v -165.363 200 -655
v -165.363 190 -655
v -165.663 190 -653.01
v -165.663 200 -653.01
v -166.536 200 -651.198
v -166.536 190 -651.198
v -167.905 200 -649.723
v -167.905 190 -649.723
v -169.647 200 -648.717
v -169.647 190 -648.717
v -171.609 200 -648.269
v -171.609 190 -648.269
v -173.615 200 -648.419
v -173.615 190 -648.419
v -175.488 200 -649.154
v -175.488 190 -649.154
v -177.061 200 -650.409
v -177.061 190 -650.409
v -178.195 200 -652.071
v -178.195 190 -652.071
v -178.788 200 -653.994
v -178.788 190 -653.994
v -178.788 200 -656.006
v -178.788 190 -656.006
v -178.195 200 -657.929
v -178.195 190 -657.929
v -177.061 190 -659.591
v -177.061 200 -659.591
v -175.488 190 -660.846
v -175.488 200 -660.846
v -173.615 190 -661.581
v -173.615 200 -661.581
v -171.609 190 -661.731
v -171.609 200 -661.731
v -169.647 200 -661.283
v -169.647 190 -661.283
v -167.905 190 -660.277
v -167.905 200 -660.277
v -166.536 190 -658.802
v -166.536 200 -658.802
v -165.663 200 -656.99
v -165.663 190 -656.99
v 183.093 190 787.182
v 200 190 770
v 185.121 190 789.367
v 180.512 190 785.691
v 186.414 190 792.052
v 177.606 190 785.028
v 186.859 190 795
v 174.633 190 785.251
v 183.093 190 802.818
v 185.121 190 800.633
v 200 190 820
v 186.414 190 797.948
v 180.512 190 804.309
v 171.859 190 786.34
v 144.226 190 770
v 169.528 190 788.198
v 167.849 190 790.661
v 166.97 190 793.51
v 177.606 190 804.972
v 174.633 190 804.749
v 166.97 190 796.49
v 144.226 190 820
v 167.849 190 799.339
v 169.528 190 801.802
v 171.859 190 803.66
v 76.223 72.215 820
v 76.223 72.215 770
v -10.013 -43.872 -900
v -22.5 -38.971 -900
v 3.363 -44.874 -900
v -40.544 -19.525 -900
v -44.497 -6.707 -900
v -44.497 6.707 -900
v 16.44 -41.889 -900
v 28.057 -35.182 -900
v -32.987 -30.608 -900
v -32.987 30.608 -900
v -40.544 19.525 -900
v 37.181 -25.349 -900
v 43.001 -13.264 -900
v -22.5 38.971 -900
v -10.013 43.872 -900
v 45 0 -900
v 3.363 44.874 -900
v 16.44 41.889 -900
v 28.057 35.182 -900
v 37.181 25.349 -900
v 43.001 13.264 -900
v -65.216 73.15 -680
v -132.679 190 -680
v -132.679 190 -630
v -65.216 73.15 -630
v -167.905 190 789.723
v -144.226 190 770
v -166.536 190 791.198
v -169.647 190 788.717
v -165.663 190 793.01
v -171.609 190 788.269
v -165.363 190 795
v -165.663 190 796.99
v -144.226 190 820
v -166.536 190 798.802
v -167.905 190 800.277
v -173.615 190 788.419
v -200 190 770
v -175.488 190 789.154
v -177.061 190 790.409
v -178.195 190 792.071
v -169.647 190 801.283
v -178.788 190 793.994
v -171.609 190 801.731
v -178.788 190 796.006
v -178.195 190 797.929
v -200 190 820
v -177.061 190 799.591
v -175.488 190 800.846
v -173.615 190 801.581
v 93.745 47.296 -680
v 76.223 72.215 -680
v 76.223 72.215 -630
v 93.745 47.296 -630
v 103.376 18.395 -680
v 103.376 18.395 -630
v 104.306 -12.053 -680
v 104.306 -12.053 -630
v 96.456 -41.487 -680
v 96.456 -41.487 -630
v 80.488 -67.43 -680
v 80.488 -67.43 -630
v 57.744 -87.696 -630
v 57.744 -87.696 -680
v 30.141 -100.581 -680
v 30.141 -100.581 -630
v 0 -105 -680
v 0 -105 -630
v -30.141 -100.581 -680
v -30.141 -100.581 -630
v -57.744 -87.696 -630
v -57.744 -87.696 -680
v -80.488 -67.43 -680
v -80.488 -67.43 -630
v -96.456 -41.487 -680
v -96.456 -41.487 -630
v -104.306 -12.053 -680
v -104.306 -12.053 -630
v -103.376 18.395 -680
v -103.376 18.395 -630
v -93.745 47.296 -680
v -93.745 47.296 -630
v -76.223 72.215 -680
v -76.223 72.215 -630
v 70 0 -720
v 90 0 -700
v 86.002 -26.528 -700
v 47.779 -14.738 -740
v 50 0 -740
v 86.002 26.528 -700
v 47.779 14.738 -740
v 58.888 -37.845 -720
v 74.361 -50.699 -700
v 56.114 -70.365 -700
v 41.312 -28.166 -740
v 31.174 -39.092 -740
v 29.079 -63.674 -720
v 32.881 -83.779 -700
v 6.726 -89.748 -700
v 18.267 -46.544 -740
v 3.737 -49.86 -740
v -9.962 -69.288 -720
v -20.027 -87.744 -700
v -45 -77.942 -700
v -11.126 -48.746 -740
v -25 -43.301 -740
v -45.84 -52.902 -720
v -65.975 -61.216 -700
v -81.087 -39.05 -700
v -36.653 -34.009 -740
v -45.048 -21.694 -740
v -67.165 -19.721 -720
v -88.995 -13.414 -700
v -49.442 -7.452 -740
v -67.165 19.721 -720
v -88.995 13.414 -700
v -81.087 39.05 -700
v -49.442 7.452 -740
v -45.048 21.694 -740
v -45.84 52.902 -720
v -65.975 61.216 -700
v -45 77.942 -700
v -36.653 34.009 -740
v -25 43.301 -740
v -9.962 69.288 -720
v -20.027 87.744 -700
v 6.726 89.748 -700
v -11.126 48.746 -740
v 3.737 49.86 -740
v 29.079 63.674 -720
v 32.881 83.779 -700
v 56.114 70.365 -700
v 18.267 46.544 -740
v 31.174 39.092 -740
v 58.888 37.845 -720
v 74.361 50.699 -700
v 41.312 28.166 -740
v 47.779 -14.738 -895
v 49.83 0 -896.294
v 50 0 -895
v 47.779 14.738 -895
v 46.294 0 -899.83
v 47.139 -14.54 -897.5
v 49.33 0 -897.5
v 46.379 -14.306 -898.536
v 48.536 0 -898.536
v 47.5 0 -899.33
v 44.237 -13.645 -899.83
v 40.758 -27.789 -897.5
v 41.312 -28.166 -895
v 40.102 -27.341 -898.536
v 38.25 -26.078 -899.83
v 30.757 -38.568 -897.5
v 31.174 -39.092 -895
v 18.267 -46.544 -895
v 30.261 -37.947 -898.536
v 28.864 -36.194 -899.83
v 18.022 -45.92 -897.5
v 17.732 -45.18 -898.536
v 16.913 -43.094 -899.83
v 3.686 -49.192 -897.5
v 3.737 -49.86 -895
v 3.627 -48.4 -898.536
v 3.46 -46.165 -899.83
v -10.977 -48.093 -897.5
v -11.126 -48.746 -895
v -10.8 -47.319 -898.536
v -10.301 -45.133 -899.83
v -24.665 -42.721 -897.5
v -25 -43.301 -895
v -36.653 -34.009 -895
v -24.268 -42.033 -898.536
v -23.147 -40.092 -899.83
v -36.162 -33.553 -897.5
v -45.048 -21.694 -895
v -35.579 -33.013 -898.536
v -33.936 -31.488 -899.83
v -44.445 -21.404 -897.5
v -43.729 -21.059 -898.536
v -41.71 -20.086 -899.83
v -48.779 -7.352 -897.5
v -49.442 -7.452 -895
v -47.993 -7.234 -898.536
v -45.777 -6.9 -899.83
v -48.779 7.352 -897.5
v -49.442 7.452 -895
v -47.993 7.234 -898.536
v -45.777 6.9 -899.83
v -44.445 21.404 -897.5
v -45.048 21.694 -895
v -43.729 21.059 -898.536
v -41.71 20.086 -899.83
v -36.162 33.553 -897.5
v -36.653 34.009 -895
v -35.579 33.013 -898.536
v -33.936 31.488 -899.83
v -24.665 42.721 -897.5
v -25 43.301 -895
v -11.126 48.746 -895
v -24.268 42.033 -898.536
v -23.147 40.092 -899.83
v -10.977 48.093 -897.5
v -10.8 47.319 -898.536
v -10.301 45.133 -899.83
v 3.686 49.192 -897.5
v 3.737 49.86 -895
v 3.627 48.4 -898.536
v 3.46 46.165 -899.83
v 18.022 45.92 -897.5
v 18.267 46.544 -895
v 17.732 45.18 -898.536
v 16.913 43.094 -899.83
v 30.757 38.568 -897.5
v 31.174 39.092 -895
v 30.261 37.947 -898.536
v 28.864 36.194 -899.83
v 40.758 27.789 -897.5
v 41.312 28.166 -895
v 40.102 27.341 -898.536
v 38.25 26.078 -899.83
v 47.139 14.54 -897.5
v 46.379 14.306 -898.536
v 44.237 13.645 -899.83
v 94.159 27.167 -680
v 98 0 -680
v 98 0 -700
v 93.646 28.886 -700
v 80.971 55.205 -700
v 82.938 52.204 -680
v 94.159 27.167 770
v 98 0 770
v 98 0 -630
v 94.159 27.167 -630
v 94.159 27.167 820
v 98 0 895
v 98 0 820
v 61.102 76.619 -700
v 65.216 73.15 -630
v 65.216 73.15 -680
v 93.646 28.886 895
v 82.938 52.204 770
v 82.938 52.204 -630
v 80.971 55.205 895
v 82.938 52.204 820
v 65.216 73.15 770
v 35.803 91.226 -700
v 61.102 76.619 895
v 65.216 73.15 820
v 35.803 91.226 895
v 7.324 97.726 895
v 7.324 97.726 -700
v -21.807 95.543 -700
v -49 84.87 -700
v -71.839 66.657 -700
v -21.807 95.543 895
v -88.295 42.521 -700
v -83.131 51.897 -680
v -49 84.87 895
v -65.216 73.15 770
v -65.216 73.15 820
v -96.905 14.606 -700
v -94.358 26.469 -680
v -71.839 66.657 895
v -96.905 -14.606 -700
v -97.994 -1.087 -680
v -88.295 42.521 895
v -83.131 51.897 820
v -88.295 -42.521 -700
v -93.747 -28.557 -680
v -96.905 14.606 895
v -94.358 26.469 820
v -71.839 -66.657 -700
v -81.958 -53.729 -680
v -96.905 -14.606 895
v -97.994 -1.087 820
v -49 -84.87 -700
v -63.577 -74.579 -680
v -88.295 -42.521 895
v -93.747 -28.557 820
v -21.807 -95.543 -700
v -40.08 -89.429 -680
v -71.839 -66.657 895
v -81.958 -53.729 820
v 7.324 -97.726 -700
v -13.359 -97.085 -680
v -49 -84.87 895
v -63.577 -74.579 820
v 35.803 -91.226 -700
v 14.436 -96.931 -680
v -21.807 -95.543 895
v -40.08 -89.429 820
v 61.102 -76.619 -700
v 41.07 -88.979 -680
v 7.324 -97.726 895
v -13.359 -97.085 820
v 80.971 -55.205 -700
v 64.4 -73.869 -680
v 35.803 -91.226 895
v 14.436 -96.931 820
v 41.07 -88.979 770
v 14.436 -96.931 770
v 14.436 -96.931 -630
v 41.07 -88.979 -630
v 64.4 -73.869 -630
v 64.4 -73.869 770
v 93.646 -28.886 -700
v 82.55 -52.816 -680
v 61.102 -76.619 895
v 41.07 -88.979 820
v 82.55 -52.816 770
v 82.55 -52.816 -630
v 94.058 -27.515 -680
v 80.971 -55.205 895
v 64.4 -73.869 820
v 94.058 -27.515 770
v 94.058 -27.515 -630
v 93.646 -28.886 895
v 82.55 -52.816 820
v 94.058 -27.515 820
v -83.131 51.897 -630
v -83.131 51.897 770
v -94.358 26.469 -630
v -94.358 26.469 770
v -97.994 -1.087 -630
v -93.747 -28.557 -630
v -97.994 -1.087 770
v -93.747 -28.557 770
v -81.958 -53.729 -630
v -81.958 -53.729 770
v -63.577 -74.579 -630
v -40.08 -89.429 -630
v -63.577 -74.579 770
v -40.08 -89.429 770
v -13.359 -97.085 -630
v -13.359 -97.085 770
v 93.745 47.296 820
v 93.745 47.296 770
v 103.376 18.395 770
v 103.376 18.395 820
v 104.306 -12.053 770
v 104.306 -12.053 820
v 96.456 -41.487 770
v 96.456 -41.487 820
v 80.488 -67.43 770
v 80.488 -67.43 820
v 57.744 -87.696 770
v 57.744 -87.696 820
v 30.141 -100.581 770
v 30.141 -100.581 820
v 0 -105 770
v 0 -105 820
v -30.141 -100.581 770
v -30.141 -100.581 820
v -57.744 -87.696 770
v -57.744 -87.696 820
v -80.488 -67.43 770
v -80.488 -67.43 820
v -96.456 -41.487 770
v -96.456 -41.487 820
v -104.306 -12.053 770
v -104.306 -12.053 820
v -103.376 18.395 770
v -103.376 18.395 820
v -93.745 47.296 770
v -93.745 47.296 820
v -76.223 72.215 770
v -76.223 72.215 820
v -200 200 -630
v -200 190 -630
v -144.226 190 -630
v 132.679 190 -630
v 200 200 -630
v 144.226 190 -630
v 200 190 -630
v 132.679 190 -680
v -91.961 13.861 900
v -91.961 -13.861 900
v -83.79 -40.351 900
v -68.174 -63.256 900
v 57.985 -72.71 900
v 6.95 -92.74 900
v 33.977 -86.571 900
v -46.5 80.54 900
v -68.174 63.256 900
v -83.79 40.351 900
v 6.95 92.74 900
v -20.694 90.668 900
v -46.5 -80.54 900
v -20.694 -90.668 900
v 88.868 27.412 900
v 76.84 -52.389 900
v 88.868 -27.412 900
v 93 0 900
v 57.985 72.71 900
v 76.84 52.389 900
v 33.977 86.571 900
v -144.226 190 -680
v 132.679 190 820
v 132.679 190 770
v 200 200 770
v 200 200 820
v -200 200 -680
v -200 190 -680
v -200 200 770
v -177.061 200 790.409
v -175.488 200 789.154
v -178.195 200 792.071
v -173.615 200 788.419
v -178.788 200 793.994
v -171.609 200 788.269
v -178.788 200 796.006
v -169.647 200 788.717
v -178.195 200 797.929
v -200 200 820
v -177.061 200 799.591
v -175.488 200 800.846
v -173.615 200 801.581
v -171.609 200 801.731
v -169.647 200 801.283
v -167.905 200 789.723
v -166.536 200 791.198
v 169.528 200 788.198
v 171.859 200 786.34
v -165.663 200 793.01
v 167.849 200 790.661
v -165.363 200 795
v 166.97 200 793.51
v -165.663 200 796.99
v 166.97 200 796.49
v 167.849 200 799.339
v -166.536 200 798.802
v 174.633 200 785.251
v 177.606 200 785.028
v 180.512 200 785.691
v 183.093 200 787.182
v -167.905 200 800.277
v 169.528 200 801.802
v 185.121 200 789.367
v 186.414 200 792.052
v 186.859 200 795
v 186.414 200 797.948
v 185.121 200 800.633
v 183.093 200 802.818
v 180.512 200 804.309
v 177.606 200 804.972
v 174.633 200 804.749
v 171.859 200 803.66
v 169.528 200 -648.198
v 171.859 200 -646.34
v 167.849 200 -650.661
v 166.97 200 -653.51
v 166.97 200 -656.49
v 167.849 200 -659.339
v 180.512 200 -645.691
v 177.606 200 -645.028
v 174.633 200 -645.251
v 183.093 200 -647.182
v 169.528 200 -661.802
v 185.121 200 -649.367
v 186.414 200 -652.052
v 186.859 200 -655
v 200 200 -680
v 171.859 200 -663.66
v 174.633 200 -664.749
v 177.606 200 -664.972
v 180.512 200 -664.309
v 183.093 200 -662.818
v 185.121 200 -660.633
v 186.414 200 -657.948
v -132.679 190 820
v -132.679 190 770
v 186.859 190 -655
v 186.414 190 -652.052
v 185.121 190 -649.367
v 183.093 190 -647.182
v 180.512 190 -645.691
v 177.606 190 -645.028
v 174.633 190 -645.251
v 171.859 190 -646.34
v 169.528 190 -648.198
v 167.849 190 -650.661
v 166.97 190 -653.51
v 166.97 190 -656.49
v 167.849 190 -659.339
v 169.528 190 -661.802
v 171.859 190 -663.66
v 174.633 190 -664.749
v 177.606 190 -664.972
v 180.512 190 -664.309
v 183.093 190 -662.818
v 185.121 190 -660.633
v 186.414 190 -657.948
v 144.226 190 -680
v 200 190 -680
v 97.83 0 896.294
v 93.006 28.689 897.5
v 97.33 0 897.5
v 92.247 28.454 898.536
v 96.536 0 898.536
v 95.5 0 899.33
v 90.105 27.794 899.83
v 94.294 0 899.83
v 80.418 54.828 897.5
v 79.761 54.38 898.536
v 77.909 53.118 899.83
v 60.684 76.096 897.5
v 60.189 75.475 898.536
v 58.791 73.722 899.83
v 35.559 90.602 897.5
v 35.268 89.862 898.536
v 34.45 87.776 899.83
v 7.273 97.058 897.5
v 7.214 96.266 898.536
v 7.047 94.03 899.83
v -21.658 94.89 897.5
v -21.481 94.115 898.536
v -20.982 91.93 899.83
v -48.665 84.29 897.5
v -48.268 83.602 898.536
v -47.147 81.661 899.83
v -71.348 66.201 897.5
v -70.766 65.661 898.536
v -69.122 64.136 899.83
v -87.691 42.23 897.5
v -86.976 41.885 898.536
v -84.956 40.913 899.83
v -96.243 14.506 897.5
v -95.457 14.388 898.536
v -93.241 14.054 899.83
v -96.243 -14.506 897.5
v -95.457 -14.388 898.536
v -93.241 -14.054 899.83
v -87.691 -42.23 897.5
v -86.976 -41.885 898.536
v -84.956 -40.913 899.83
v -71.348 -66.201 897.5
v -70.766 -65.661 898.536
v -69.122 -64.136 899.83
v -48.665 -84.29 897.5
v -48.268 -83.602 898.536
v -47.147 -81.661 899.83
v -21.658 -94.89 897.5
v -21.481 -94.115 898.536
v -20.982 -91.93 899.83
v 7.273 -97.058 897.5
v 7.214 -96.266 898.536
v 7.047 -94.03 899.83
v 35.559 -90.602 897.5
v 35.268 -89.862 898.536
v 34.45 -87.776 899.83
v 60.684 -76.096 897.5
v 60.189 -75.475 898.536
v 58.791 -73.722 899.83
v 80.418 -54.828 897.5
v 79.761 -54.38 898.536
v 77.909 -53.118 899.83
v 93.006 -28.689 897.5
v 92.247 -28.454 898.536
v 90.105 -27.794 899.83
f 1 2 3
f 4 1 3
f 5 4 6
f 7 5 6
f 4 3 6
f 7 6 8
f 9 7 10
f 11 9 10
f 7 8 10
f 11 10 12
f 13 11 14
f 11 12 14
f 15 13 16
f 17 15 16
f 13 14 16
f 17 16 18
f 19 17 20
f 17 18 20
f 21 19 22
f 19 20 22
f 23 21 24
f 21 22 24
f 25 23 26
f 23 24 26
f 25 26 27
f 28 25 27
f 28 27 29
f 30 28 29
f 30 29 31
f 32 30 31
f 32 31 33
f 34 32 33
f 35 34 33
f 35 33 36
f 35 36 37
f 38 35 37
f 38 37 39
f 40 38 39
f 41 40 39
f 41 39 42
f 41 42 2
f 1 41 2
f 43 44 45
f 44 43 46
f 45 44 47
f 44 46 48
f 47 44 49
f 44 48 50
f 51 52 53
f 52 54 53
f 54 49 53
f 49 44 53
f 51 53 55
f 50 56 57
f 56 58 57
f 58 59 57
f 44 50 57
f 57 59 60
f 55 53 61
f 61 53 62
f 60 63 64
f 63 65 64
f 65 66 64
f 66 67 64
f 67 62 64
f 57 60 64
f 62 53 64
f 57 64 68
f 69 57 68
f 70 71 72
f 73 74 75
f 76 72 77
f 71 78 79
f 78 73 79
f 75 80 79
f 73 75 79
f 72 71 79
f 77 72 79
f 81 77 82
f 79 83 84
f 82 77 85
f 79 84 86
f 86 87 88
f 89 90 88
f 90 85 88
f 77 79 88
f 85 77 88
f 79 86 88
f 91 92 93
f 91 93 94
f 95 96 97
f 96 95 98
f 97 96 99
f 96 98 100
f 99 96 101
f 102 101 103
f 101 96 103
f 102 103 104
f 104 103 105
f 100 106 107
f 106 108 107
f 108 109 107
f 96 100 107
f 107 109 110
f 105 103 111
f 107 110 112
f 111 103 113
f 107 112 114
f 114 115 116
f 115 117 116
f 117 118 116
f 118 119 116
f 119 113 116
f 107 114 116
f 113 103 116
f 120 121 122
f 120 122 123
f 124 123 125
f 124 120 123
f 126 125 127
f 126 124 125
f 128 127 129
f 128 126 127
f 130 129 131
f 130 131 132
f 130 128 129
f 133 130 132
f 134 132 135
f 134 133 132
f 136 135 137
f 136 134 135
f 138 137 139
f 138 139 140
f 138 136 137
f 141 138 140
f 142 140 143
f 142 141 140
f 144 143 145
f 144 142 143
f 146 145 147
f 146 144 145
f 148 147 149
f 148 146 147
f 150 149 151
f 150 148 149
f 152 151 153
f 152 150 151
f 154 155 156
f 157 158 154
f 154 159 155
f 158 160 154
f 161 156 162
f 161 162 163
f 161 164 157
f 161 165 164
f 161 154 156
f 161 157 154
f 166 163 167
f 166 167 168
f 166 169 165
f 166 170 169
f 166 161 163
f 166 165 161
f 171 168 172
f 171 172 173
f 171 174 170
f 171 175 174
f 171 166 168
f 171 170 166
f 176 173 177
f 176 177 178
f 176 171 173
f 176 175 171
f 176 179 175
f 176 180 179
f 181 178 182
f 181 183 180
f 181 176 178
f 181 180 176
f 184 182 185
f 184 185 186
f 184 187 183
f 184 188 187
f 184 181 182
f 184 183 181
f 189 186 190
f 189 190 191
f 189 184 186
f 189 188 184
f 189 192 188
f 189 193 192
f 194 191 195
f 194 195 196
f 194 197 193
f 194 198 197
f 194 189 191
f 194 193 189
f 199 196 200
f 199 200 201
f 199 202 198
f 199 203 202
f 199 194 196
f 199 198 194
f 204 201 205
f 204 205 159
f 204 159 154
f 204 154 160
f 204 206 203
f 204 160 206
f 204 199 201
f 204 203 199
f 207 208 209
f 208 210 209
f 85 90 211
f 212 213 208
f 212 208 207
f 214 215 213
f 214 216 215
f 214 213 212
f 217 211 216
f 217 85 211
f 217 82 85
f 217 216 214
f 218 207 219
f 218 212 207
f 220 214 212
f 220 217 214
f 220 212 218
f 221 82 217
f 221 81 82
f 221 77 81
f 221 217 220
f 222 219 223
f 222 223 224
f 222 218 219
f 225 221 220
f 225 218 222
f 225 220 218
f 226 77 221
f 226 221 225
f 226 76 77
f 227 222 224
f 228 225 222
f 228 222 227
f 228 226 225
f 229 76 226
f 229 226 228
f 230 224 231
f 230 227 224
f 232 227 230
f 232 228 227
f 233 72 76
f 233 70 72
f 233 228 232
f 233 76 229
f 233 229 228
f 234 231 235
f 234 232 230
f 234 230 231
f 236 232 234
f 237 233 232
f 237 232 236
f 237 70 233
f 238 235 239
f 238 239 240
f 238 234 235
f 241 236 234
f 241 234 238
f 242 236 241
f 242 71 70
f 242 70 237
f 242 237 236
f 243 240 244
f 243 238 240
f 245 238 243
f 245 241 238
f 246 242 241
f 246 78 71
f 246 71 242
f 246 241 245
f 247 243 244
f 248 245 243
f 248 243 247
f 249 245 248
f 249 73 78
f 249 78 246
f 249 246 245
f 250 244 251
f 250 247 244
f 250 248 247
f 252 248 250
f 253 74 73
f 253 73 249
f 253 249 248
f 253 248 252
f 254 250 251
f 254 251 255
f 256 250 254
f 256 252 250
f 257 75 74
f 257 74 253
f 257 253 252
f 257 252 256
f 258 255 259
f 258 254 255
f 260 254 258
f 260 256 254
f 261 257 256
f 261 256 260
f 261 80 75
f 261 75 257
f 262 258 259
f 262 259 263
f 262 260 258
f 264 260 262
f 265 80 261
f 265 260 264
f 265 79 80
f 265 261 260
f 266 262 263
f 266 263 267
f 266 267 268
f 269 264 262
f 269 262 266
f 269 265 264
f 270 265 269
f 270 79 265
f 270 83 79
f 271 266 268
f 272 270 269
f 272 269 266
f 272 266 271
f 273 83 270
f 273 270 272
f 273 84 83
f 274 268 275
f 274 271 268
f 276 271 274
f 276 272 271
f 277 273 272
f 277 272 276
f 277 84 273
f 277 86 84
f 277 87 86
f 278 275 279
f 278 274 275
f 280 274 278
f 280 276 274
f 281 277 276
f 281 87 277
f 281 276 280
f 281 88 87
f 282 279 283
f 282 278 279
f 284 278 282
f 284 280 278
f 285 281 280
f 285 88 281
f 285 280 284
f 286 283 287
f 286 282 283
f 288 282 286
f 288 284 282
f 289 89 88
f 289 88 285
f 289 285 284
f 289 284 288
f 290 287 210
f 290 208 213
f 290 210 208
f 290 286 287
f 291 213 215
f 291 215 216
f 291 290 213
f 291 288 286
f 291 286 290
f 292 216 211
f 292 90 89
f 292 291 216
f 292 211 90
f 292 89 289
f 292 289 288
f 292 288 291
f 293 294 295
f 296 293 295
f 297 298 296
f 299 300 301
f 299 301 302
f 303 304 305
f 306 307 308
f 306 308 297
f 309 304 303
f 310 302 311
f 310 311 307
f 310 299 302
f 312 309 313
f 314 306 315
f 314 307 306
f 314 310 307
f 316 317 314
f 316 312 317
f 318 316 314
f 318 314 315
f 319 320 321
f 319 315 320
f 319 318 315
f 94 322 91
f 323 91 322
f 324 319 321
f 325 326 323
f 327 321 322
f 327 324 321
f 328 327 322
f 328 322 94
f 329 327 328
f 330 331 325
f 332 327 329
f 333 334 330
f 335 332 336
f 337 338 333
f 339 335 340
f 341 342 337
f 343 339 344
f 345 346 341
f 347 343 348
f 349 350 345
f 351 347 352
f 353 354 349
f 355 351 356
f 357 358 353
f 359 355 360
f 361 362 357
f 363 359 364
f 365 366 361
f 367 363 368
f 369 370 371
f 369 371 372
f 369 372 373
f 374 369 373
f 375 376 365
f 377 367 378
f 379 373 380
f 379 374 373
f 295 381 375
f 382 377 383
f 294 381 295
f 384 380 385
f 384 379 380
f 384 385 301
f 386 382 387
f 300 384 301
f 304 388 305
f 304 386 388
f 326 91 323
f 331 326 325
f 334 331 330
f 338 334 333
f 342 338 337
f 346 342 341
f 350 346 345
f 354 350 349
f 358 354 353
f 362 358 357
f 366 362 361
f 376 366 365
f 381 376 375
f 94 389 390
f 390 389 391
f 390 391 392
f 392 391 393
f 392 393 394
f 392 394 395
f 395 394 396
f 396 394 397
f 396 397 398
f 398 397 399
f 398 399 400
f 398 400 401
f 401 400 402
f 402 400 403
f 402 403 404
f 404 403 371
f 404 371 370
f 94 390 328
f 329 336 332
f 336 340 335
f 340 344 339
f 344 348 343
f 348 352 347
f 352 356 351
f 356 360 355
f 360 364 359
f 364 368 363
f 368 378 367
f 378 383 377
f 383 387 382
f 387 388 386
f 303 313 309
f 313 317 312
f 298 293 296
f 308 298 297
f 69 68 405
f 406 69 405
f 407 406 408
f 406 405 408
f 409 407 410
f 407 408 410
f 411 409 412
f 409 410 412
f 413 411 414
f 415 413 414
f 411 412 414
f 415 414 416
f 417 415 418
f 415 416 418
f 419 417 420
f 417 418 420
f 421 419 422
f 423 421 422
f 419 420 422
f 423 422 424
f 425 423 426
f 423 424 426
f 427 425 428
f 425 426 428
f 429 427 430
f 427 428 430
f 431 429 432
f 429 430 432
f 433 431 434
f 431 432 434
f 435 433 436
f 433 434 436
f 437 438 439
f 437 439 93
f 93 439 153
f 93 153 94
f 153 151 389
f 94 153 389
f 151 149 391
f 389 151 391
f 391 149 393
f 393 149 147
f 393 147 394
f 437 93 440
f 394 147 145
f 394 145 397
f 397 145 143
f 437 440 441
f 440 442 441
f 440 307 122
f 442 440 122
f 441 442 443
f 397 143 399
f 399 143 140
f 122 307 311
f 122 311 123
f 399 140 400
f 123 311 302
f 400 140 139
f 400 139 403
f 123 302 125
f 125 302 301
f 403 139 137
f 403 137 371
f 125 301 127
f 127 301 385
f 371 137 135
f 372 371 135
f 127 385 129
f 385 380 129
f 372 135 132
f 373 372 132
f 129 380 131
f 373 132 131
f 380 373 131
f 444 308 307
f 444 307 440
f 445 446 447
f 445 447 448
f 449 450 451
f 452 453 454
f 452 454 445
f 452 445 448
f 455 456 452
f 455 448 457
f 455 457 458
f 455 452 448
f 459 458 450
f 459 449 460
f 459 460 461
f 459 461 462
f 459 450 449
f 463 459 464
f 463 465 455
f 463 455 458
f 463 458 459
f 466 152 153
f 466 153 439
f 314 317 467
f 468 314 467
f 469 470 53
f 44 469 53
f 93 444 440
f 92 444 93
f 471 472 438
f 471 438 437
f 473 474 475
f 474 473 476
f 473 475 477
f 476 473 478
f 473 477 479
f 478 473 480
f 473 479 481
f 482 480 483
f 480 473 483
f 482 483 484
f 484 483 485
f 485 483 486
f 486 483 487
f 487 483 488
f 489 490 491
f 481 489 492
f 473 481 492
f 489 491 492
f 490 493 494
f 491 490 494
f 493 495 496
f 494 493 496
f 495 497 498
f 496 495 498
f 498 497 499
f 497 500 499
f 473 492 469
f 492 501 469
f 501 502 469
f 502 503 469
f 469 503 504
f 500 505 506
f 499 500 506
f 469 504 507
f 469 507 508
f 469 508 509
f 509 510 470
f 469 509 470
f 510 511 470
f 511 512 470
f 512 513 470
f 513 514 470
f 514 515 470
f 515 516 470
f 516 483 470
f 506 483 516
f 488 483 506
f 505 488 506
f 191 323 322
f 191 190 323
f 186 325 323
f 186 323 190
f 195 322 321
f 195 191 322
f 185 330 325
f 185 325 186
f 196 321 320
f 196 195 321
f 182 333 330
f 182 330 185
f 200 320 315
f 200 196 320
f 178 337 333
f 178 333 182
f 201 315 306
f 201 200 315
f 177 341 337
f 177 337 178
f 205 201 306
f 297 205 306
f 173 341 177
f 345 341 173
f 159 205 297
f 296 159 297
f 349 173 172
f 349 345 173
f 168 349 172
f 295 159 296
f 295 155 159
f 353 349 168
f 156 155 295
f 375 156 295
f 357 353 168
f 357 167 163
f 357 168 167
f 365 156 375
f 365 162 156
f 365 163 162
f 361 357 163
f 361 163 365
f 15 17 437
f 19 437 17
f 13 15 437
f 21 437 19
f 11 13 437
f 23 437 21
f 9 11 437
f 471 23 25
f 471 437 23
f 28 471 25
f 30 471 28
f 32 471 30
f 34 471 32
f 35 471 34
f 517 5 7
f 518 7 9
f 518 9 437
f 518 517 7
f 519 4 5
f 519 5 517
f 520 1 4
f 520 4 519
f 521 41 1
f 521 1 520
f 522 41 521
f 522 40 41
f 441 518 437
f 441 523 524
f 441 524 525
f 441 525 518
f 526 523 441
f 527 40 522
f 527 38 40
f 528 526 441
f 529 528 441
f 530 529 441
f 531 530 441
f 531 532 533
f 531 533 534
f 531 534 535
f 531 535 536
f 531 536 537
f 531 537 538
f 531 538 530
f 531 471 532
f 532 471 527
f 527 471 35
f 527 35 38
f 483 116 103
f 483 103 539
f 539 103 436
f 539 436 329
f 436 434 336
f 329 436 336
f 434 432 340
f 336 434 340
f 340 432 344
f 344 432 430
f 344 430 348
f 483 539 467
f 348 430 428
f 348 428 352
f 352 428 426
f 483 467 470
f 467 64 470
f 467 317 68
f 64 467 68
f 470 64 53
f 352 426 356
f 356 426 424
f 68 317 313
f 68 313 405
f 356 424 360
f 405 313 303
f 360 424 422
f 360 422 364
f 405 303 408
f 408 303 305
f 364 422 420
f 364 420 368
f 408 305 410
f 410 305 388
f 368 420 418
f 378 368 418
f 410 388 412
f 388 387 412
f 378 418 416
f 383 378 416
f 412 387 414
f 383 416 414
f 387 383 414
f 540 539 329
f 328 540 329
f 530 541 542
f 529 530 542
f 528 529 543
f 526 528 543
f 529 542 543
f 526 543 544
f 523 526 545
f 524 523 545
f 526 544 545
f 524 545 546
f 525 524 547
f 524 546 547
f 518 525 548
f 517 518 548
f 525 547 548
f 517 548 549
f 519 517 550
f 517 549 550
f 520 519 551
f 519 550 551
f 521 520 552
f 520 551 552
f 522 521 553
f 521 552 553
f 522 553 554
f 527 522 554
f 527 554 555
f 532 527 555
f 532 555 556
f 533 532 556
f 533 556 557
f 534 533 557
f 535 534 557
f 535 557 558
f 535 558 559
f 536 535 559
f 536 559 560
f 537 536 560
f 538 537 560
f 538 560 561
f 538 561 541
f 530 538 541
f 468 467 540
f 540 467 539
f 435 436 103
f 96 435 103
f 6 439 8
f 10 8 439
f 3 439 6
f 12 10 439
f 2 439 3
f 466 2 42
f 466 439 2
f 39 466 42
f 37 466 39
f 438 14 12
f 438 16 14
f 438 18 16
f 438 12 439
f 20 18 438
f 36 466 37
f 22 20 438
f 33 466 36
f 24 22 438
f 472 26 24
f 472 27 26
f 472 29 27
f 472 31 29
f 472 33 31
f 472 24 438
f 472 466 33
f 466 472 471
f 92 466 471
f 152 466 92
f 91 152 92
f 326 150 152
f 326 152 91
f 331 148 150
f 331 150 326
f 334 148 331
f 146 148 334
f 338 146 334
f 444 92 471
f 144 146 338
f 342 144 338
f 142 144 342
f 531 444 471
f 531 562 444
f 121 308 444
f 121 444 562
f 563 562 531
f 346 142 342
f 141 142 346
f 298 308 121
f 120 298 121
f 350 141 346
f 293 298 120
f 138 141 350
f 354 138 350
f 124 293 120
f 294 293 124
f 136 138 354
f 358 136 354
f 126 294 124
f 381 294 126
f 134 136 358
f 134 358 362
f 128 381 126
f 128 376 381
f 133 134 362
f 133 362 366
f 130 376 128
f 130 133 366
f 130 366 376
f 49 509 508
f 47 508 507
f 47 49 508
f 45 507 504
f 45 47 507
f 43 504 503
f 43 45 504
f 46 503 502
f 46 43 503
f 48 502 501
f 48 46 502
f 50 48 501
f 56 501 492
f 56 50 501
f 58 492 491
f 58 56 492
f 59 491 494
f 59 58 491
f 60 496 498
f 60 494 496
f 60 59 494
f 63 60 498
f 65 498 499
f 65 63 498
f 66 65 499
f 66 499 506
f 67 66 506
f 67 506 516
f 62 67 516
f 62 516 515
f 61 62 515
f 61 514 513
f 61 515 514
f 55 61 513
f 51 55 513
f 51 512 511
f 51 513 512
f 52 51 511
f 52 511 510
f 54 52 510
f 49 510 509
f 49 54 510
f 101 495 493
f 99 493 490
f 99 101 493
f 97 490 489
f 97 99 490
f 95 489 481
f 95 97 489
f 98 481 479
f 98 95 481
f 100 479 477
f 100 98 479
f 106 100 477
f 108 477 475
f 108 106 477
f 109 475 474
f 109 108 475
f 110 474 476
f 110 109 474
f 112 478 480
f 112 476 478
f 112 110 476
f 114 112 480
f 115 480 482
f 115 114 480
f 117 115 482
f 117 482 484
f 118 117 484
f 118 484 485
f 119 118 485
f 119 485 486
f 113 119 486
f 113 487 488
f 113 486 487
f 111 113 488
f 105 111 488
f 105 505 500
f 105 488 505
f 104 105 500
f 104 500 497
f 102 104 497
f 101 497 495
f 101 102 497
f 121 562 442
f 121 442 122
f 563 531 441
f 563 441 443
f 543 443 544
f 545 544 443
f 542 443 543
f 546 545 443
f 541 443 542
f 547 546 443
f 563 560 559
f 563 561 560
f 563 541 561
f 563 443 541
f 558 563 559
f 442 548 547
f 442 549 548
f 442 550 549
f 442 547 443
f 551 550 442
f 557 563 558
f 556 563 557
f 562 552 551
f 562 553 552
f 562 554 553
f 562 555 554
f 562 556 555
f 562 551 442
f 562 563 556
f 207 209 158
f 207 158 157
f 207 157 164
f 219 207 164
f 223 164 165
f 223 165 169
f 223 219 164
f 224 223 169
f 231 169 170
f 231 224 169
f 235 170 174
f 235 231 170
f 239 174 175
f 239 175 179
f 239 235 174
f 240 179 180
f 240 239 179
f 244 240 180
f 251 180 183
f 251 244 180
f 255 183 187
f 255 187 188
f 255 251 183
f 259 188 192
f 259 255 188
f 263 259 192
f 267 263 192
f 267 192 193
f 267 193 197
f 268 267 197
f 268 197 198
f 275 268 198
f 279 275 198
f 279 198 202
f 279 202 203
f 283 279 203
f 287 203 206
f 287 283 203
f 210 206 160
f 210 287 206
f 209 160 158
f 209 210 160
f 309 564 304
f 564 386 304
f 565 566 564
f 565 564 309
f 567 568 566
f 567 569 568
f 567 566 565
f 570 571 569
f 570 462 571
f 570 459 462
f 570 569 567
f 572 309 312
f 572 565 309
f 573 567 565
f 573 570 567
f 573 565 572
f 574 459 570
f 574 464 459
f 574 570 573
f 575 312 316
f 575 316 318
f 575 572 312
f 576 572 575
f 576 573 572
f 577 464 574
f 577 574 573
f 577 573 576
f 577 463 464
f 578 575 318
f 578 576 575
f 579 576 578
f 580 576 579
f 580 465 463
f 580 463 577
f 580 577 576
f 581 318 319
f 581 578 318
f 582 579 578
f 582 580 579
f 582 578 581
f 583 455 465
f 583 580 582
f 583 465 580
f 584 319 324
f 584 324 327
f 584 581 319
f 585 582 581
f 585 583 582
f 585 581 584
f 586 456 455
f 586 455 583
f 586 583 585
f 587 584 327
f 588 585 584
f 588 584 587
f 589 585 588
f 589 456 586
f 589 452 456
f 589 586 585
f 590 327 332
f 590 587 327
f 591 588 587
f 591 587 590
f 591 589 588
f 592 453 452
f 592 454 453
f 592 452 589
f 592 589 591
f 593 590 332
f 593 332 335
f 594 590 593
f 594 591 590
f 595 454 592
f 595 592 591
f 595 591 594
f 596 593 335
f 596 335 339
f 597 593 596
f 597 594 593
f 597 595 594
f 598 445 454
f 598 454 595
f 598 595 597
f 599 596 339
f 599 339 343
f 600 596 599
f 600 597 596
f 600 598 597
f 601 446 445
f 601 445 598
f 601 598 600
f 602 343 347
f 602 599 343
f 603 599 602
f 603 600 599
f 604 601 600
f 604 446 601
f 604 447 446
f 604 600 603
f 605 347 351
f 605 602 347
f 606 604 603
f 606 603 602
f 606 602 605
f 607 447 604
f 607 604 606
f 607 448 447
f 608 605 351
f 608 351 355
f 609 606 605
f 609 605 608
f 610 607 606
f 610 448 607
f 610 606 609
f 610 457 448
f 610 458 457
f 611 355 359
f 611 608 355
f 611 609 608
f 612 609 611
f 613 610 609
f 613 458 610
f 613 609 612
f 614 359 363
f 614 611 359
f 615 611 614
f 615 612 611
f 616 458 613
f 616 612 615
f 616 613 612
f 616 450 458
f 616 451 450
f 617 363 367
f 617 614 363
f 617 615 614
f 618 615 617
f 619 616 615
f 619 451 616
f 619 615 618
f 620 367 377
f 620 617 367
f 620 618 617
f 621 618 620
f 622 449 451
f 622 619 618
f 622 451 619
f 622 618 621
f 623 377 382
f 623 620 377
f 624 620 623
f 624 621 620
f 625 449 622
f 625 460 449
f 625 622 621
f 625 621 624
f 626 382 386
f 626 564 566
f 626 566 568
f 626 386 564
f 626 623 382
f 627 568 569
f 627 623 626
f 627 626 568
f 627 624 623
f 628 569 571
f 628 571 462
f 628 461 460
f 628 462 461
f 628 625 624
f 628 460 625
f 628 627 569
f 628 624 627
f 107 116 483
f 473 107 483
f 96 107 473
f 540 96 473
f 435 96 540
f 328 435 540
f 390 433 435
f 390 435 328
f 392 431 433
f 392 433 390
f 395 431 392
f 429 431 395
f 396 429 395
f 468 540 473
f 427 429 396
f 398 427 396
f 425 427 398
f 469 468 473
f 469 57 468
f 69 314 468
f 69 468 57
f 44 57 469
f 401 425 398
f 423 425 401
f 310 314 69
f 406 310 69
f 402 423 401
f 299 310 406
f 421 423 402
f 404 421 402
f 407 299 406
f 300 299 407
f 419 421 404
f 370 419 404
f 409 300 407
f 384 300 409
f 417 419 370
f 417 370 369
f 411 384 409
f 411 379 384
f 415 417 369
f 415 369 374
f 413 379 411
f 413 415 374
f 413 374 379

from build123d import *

# Parameters (mm, degrees)
F0_R      = 98
F1_DEPTH  = 900
F2_R      = 98
F2_R_2    = 50
F3_DEPTH  = 200
F4_SIZE   = 40
F5_R      = 5
F8_DEPTH  = 50
F9_R      = 6.75
F9_R_2    = 10
F10_DEPTH = 10.001


# Not quite as in the source:
# - a pattern or mirror of a feature is missing from the dataset's text; its kind, count and spacing are read off the source's solid


with BuildPart() as f1:
    # F0 (on Top) → F1 (new body, symmetric)
    with BuildSketch(Plane.XY):
        Circle(F0_R)
    extrude(amount=F1_DEPTH, both=True)

    # F2 (on face) → F3 (cut)
    with BuildSketch(Plane(origin=(0, 0, -900), x_dir=(1, 0, 0), z_dir=(0, 0, -1))):
        Circle(F2_R)
        Circle(F2_R_2, mode=Mode.SUBTRACT)
    extrude(amount=-F3_DEPTH, mode=Mode.SUBTRACT)

    # F4
    f4_edges = [f1.edges().sort_by_distance(p)[0] for p in [
        (-50, 0, -700),
    ]]
    chamfer(f4_edges, length=F4_SIZE)

    # F5
    f5_edges = [f1.edges().sort_by_distance(p)[0] for p in [
        (-50, 0, -900),
        (-98, 0, 900),
    ]]
    fillet(f5_edges, radius=F5_R)

    # F7 (on offset) → F8 (join)
    with BuildSketch(Plane(origin=(0, 0, -680), x_dir=(1, 0, 0), z_dir=(0, 0, -1))):
        Polygon((76.2233031652, -72.2150126676), (65.2159465136, -73.14971169), (132.6794919243, -190), (-132.6794919243, -190), (-65.2159465136, -73.14971169), (-76.2233031652, -72.2150126676), (-144.2264973081, -190), (-200, -190), (-200, -200), (-150, -200), (150, -200), (200, -200), (200, -190), (144.2264973081, -190), align=None)
        with BuildLine():
            ThreePointArc((-65.2159465136, -73.14971169), (0, 98), (65.2159465136, -73.14971169))
            Line((65.2159465136, -73.14971169), (76.2233031652, -72.2150126676))
            ThreePointArc((76.2233031652, -72.2150126676), (0, 105), (-76.2233031652, -72.2150126676))
            Line((-76.2233031652, -72.2150126676), (-65.2159465136, -73.14971169))
        make_face()
    f8 = extrude(amount=-F8_DEPTH)

    # F8_copies: F8 across plane
    add(f8.mirror(Plane.XY.offset(70)))

    # F9 (on face) → F10 (cut, through all)
    with BuildSketch(Plane.XZ.offset(-190)):
        with Locations((-172.1132486541, -655)):
            Circle(F9_R)
        with Locations((176.858574152, -655)):
            Circle(F9_R_2)
    f10 = extrude(amount=-F10_DEPTH, mode=Mode.SUBTRACT)

    # F10_copies: F10 across plane
    add(f10.mirror(Plane.XY.offset(70)), mode=Mode.SUBTRACT)


solid = f1.part
